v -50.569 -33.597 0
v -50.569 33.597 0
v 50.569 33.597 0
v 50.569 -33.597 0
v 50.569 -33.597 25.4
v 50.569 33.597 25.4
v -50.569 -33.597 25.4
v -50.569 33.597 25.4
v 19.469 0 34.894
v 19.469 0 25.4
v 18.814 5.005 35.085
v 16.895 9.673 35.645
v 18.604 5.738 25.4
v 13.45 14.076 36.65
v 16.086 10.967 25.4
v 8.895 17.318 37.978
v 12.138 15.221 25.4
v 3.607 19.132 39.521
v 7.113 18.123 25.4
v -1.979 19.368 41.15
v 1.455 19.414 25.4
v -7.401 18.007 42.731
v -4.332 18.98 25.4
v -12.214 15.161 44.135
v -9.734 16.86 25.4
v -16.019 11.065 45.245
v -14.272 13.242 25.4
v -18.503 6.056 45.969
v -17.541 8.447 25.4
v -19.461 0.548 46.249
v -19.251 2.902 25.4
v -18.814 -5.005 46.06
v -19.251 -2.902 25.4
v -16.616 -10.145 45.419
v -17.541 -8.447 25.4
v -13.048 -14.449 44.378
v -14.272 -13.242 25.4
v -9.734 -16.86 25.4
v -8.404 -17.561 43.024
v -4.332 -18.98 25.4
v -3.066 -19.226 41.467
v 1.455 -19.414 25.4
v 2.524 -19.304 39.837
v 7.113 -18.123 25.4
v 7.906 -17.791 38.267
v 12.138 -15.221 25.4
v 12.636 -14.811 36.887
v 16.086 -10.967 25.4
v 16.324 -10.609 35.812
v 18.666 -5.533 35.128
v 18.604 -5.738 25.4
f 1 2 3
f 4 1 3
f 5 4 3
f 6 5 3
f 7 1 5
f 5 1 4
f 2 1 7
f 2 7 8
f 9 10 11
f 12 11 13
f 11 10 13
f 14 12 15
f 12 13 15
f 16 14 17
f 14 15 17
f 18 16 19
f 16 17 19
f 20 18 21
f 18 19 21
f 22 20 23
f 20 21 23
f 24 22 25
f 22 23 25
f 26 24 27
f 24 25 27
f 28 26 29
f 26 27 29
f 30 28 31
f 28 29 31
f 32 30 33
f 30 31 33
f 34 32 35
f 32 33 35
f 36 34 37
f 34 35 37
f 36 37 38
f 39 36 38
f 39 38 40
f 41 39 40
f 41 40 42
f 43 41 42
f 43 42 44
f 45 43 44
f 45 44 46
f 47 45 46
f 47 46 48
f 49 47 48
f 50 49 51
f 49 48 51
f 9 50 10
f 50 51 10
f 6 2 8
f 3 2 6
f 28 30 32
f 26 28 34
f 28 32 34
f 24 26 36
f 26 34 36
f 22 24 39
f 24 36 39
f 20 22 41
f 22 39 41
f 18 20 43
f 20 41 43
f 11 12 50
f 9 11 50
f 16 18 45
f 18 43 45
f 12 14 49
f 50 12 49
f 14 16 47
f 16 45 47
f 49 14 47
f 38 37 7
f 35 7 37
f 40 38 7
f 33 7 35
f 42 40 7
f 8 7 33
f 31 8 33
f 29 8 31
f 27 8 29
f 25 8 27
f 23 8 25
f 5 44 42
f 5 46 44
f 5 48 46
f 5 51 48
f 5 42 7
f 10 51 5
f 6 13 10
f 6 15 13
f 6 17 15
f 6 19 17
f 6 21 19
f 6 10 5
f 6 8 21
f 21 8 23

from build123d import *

# Parameters (mm, degrees)
F0_W     = 101.13819
F0_H     = 67.194544
F1_DEPTH = 25.4
F2_R     = 19.468615
F3_DEPTH = 25.4
F5_DEPTH = 82.804


with BuildPart() as f1:
    # F0 (on Top) → F1 (new body)
    with BuildSketch(Plane.XY):
        Rectangle(F0_W, F0_H)
    extrude(amount=F1_DEPTH)

    # F2 (on face) → F3 (join)
    with BuildSketch(Plane.XY.offset(25.4)):
        Circle(F2_R)
    extrude(amount=F3_DEPTH)

    # F4 (on face) → F5 (cut)
    with BuildSketch(Plane.XZ.offset(33.597272)):
        Polygon((-19.627273, 46.297271), (20.550909, 34.578636), (20.550909, 51.608179), (-19.627273, 51.608179), align=None)
    extrude(amount=-F5_DEPTH, mode=Mode.SUBTRACT)


solid = f1.part
